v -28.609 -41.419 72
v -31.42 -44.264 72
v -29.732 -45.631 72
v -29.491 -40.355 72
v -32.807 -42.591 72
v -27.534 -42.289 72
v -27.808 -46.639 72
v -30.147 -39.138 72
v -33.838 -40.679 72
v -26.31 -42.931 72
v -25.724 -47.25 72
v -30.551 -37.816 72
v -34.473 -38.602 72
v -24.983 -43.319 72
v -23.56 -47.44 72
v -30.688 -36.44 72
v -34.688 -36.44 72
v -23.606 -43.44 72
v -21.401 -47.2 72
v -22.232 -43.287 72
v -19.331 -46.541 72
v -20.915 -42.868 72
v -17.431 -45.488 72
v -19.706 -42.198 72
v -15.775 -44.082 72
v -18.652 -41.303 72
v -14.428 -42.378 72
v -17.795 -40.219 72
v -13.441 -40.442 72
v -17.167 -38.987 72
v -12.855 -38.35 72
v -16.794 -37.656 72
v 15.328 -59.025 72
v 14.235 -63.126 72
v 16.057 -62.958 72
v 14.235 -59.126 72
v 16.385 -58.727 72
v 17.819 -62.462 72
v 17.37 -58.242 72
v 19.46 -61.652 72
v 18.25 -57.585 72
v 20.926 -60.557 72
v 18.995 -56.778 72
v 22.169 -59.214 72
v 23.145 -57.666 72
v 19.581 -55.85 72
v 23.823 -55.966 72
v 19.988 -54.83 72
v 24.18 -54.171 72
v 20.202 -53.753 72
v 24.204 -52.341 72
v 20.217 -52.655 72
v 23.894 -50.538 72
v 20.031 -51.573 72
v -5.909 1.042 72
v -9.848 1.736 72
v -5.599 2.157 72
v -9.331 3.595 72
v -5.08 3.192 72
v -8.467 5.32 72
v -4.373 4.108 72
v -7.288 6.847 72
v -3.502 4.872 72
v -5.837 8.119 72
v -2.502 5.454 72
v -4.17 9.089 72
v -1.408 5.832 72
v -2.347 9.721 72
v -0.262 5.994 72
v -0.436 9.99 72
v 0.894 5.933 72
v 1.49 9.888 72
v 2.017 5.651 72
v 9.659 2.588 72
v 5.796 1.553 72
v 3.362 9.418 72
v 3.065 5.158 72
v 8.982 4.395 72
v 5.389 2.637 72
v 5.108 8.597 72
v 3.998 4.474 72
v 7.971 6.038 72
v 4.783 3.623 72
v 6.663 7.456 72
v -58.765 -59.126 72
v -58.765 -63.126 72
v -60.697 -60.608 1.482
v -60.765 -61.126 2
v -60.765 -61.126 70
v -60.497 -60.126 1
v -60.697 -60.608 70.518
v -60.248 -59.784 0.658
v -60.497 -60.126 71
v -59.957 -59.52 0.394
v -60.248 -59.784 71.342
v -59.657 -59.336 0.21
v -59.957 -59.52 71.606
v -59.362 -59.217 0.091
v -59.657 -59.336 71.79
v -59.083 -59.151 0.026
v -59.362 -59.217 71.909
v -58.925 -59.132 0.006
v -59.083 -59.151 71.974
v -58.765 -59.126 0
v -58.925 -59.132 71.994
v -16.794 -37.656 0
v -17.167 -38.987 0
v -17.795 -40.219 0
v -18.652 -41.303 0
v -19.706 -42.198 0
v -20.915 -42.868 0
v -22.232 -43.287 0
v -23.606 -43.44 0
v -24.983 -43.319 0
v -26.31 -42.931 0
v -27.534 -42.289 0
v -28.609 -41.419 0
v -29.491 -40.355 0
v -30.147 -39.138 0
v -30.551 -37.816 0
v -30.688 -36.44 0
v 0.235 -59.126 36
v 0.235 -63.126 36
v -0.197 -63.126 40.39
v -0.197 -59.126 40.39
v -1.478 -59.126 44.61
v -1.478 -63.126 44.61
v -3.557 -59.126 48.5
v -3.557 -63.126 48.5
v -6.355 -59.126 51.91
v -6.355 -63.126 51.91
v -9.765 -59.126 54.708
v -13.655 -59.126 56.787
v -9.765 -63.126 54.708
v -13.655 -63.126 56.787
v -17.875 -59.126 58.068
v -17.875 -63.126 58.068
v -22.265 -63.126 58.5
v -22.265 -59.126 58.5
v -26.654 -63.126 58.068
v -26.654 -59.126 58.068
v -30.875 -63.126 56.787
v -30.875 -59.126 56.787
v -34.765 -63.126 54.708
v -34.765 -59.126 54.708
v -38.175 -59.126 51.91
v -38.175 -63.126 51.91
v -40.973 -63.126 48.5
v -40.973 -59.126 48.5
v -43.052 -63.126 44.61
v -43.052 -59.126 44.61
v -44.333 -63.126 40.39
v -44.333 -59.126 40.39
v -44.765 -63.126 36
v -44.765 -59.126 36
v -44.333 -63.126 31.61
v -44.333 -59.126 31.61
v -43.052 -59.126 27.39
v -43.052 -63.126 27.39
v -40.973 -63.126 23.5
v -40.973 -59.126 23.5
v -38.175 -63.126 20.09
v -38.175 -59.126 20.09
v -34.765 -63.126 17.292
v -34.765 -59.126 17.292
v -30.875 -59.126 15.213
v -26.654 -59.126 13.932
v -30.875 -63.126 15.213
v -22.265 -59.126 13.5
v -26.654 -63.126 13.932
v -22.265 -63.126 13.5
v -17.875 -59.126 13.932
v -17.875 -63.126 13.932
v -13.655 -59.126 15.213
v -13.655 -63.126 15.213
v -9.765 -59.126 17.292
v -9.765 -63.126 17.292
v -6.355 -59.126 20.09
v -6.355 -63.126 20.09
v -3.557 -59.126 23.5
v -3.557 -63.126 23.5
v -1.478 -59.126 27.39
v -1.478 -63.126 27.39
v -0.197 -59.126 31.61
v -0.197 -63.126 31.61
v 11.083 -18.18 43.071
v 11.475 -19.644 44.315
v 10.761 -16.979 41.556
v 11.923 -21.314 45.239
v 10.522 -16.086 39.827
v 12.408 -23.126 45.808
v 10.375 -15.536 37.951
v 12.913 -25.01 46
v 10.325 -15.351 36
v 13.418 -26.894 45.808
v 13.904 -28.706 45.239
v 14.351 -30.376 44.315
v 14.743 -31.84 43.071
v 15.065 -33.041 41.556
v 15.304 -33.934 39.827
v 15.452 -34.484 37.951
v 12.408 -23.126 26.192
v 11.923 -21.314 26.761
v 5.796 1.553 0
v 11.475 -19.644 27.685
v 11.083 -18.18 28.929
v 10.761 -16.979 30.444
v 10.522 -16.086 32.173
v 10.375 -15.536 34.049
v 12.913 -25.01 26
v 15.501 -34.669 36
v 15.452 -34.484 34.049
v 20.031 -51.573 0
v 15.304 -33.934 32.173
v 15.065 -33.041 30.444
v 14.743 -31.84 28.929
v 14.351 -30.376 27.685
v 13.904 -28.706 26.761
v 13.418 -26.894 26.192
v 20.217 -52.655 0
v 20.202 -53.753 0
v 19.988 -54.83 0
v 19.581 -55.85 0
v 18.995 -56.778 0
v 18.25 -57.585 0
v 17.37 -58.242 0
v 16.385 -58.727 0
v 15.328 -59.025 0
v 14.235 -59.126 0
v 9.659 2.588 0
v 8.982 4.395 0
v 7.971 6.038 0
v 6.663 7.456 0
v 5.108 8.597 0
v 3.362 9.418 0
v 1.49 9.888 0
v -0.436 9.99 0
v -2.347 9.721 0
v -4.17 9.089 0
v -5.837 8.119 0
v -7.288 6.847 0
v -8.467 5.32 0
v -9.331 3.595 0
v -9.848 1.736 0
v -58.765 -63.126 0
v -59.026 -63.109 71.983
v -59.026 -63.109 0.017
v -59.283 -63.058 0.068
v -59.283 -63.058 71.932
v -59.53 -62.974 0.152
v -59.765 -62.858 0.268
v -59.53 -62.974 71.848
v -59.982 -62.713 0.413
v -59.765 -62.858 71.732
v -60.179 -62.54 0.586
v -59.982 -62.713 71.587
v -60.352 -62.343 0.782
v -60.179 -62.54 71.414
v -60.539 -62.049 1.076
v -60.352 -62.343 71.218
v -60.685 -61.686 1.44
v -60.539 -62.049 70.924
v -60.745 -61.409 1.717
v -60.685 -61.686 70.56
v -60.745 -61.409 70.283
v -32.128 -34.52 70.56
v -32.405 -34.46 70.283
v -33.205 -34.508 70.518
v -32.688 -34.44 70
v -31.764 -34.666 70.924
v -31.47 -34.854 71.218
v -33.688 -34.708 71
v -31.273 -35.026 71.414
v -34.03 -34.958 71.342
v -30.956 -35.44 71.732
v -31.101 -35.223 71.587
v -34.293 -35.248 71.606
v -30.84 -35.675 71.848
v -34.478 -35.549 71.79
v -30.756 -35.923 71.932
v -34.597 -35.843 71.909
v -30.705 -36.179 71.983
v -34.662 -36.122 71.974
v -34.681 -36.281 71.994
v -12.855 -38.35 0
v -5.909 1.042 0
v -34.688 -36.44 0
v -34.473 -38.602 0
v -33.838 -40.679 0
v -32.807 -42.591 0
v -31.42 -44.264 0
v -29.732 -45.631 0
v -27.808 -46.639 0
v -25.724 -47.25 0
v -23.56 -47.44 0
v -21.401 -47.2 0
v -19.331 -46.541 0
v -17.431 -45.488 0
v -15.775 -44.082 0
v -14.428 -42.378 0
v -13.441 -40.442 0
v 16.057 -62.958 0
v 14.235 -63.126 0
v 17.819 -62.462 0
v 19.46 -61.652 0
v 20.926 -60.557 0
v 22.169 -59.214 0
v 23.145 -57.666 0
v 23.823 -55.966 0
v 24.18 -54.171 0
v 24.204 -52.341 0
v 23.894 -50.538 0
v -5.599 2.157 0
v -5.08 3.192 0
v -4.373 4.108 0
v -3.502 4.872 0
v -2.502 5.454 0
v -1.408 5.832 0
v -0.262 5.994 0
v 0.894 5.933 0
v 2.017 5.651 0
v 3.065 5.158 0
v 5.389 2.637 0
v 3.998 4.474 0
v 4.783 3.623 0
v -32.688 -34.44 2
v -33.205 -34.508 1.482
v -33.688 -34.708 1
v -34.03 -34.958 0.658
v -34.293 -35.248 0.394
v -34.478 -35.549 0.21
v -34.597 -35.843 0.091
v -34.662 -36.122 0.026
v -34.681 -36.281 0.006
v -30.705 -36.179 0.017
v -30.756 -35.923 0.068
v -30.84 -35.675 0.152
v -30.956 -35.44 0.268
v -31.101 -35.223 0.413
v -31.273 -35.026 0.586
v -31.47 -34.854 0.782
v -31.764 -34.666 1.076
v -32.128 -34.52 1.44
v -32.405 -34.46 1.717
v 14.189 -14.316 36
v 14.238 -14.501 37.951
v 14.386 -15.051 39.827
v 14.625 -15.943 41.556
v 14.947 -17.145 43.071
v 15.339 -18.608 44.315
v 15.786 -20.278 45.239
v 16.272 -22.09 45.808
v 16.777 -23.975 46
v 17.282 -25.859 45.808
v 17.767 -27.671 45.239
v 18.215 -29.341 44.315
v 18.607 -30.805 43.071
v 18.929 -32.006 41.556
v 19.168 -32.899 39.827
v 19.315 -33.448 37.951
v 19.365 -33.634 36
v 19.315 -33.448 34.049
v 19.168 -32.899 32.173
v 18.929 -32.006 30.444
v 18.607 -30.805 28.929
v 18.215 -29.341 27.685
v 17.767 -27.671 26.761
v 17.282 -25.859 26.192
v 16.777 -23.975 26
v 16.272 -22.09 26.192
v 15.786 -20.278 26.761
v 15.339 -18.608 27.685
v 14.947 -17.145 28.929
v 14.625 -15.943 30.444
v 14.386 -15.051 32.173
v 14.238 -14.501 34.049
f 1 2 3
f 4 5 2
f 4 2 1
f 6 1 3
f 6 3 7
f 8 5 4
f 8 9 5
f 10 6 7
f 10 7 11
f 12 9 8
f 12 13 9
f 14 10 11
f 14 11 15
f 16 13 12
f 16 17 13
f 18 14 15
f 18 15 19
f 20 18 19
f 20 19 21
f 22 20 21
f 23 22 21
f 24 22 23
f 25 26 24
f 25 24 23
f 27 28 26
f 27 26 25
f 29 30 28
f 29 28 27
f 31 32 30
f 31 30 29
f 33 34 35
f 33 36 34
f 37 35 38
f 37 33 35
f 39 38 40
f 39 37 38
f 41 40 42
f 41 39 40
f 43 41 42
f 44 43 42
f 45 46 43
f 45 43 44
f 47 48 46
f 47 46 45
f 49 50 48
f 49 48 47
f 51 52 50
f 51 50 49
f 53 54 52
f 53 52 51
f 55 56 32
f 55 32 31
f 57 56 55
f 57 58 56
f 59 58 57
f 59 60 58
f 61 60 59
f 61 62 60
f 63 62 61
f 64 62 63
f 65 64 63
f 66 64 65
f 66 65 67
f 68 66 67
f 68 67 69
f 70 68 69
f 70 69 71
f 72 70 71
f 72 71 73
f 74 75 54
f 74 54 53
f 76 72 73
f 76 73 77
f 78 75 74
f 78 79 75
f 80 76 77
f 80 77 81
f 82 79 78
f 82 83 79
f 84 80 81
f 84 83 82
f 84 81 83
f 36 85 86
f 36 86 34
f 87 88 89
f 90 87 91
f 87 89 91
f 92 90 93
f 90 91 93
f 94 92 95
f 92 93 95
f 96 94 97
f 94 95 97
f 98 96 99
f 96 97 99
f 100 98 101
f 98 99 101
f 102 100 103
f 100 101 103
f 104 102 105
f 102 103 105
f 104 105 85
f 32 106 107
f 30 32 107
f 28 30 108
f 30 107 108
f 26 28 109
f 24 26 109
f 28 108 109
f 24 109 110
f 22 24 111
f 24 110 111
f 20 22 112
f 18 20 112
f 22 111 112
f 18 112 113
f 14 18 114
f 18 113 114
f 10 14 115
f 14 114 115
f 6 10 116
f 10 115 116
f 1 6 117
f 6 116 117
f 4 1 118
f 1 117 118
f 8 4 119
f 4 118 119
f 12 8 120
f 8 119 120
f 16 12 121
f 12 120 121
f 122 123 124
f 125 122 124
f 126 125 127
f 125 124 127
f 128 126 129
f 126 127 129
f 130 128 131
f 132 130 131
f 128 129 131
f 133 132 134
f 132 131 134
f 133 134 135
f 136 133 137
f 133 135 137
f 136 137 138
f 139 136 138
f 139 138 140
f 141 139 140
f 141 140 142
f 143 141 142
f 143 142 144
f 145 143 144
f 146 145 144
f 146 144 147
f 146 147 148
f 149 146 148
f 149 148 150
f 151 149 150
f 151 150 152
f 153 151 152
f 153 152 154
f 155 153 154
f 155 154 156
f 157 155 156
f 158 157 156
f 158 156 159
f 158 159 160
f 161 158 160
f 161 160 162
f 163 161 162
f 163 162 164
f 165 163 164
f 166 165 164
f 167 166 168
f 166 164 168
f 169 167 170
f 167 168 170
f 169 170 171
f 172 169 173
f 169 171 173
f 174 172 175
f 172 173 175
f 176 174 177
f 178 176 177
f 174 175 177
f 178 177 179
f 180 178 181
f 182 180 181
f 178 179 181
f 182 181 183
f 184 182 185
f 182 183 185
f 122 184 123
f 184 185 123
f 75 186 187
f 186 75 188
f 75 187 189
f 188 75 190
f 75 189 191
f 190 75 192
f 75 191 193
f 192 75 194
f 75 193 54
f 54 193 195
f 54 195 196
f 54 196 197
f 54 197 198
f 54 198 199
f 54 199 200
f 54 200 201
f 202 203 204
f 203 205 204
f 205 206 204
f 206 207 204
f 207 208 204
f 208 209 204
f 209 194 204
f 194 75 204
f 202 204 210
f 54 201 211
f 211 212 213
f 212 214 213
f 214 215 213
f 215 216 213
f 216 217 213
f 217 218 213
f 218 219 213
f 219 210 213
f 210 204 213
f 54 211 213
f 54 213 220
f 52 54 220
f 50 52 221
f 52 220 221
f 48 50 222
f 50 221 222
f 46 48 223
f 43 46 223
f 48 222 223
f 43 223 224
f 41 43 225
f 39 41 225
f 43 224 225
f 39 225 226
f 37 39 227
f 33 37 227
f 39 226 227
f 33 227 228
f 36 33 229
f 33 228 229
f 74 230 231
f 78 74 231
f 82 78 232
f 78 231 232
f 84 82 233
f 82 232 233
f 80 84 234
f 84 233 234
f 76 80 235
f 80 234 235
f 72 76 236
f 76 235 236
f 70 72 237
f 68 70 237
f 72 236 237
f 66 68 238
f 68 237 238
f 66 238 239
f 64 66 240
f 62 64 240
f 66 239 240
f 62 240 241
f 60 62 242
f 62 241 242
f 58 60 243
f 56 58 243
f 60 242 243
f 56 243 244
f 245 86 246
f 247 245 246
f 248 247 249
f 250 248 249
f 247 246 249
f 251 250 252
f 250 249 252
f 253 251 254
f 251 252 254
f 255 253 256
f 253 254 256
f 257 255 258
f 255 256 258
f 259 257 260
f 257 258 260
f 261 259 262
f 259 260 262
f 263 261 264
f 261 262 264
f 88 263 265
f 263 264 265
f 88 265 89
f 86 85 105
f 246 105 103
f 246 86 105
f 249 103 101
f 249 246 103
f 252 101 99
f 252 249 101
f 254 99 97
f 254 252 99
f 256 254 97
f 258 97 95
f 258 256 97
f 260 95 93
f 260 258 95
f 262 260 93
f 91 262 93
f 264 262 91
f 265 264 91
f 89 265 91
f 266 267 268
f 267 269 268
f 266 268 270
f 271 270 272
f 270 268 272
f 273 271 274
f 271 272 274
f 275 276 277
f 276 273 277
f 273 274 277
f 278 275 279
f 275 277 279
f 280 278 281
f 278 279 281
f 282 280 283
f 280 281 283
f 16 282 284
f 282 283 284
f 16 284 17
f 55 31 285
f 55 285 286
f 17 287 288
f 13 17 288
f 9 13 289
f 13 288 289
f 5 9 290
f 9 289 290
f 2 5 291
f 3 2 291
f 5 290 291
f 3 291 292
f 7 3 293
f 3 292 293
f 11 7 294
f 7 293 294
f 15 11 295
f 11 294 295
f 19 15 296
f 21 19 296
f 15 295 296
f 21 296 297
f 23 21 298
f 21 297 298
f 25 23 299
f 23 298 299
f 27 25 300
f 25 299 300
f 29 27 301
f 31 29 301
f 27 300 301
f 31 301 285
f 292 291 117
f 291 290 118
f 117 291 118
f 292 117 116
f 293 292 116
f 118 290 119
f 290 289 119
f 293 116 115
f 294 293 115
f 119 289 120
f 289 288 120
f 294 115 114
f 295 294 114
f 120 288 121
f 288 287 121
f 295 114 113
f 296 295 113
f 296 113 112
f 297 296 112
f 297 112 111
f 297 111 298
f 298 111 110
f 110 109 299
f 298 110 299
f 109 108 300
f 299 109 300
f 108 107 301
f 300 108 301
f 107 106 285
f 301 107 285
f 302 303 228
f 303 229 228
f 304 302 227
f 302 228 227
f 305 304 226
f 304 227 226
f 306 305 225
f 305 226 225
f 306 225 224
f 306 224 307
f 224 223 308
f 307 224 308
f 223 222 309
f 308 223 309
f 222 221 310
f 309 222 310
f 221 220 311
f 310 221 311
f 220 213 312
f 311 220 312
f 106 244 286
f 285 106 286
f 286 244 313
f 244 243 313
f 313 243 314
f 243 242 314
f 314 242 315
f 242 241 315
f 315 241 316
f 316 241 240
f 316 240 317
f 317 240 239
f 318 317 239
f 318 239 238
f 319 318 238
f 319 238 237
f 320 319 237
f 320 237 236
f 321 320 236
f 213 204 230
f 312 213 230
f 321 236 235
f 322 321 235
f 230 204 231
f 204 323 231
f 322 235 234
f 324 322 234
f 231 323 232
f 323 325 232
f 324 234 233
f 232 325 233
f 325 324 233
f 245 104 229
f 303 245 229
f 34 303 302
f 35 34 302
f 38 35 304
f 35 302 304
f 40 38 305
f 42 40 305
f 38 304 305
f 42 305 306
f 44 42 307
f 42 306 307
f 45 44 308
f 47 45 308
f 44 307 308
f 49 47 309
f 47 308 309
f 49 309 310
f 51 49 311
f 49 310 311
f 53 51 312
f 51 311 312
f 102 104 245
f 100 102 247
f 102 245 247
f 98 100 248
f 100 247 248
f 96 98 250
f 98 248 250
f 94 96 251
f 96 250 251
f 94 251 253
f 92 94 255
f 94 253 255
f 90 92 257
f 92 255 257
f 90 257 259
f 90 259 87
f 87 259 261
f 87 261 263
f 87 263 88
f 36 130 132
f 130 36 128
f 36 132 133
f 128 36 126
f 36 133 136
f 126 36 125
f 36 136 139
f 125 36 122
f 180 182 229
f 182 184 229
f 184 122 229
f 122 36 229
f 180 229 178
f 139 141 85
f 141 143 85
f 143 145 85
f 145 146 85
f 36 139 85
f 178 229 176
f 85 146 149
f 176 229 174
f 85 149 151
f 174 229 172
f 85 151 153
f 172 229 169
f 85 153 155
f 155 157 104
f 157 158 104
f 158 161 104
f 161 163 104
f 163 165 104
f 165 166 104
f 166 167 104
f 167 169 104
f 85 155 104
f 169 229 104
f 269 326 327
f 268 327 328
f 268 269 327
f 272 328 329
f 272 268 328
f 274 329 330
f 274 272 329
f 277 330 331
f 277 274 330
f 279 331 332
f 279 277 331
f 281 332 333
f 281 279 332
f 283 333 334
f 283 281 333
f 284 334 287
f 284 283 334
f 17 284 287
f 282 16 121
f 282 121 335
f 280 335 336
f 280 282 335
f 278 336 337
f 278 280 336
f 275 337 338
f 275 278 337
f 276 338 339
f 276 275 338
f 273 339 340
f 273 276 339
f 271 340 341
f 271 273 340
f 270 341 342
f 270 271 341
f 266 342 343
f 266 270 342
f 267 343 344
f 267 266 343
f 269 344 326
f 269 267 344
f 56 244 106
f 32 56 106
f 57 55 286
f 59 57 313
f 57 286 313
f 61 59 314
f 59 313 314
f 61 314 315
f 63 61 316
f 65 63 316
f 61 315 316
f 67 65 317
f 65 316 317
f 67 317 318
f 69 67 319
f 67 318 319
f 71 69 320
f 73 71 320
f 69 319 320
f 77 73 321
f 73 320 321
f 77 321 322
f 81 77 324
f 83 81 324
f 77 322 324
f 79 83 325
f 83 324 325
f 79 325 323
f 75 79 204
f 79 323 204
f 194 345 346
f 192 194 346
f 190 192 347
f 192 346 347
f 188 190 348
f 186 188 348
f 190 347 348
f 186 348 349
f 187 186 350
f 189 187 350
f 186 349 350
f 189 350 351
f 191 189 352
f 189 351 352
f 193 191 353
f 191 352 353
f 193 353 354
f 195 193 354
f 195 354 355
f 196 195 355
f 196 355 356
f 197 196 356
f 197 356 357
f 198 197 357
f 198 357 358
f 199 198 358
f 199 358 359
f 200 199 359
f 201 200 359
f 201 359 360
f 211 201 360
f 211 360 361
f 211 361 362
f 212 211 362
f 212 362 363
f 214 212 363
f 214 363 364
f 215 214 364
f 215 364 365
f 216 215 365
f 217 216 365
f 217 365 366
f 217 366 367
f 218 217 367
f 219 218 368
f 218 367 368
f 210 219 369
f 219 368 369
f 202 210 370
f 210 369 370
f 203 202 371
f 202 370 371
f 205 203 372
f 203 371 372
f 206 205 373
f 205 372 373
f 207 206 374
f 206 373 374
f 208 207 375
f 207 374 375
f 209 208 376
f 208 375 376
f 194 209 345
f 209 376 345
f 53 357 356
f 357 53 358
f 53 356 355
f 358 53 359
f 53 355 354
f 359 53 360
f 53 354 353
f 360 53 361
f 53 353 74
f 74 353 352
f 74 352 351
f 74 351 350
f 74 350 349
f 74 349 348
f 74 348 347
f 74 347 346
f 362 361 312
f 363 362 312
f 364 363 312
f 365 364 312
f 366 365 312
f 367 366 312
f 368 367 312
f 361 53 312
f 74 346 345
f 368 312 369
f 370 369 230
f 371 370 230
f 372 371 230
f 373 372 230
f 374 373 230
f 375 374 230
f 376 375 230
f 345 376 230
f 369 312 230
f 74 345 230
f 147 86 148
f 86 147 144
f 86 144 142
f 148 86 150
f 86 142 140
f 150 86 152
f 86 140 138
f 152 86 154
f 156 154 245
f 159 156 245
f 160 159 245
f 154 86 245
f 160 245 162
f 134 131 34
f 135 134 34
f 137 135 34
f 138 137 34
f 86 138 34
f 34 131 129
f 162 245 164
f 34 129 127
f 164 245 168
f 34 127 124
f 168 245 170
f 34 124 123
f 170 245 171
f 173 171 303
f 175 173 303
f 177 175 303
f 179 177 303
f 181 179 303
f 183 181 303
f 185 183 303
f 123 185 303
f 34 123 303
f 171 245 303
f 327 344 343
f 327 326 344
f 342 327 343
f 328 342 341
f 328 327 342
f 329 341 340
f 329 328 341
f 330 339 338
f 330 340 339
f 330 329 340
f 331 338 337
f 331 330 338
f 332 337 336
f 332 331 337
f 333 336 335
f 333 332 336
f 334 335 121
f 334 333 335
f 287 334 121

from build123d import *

# Parameters (mm, degrees)
F1_DEPTH = 72
F2_R     = 1.99999
F3_R     = 1.99999
F4_R     = 10
F5_DEPTH = 5
F8_R     = 22.5
F9_DEPTH = 5


# Not quite as in the source:
# - a fillet or chamfer is up to 0.001 mm smaller than in the source, because OpenCascade refuses the exact size
# - a feature of the source that left no trace in its solid (it failed there, or was rolled back) is left out


with BuildPart() as f1:
    # F0 (on Top) → F1 (new body)
    with BuildSketch(Plane.XY):
        with BuildLine():
            Line((-9.8480775301, 1.7364817767), (-16.7940046368, -37.6558283438))
            ThreePointArc((-16.7940046368, -37.6558283438), (-24.2977491071, -43.4136539868), (-30.6876589079, -36.4402911002))
            Line((-30.6876589079, -36.4402911002), (-30.6876589079, -34.4402911002))
            Line((-30.6876589079, -34.4402911002), (-34.6876589079, -34.4402911002))
            Line((-34.6876589079, -34.4402911002), (-34.6876589079, -36.4402911002))
            ThreePointArc((-34.6876589079, -36.4402911002), (-24.6463720781, -47.3984327792), (-12.8547736248, -38.3504210545))
            Line((-12.8547736248, -38.3504210545), (-5.9088465181, 1.041889066))
            ThreePointArc((-5.9088465181, 1.041889066), (-0.2617163242, 5.9942893295), (5.7955549577, 1.5529142706))
            Line((5.7955549577, 1.5529142706), (20.0306024384, -51.5730061753))
            ThreePointArc((20.0306024384, -51.5730061753), (18.9951675224, -56.77848902), (14.2350474806, -59.1259204459))
            Line((14.2350474806, -59.1259204459), (-60.7649525194, -59.1259204459))
            Line((-60.7649525194, -59.1259204459), (-60.7649525194, -63.1259204459))
            Line((-60.7649525194, -63.1259204459), (14.2350474806, -63.1259204459))
            ThreePointArc((14.2350474806, -63.1259204459), (22.1685808836, -59.213534736), (23.8943057435, -50.5377299949))
            Line((23.8943057435, -50.5377299949), (9.6592582629, 2.588190451))
            ThreePointArc((9.6592582629, 2.588190451), (-0.4361938737, 9.9904822158), (-9.8480775301, 1.7364817767))
        make_face()
    extrude(amount=F1_DEPTH)

    # F2 (radius 2 in the source; OpenCascade refuses exactly that, so slightly less here)
    f2_edges = [f1.edges().sort_by_distance(p)[0] for p in [
        (-30.687659, -34.440291, 36),
        (-34.687659, -34.440291, 36),
        (-32.687659, -34.440291, 0),
        (-32.687659, -34.440291, 72),
    ]]
    fillet(f2_edges, radius=F2_R)

    # F3 (radius 2 in the source; OpenCascade refuses exactly that, so slightly less here)
    f3_edges = [f1.edges().sort_by_distance(p)[0] for p in [
        (-60.764953, -59.12592, 36),
        (-60.764953, -63.12592, 36),
        (-60.764953, -61.12592, 0),
        (-60.764953, -61.12592, 72),
    ]]
    fillet(f3_edges, radius=F3_R)

    # F4 (on face) → F5 (cut)
    with BuildSketch(Plane(origin=(9.6592582629, 2.588190451, 0), x_dir=(-0.2588190451, 0.9659258263, 0), z_dir=(0.9659258263, 0.2588190451, 0))):
        with Locations((-27.5, 36)):
            Circle(F4_R)
    extrude(amount=-F5_DEPTH, mode=Mode.SUBTRACT)

    # F8 (on face) → F9 (cut)
    with BuildSketch(Plane.XZ.offset(63.1259204459)):
        with Locations((-22.2649525194, 36)):
            Circle(F8_R)
    extrude(amount=-F9_DEPTH, mode=Mode.SUBTRACT)


solid = f1.part
